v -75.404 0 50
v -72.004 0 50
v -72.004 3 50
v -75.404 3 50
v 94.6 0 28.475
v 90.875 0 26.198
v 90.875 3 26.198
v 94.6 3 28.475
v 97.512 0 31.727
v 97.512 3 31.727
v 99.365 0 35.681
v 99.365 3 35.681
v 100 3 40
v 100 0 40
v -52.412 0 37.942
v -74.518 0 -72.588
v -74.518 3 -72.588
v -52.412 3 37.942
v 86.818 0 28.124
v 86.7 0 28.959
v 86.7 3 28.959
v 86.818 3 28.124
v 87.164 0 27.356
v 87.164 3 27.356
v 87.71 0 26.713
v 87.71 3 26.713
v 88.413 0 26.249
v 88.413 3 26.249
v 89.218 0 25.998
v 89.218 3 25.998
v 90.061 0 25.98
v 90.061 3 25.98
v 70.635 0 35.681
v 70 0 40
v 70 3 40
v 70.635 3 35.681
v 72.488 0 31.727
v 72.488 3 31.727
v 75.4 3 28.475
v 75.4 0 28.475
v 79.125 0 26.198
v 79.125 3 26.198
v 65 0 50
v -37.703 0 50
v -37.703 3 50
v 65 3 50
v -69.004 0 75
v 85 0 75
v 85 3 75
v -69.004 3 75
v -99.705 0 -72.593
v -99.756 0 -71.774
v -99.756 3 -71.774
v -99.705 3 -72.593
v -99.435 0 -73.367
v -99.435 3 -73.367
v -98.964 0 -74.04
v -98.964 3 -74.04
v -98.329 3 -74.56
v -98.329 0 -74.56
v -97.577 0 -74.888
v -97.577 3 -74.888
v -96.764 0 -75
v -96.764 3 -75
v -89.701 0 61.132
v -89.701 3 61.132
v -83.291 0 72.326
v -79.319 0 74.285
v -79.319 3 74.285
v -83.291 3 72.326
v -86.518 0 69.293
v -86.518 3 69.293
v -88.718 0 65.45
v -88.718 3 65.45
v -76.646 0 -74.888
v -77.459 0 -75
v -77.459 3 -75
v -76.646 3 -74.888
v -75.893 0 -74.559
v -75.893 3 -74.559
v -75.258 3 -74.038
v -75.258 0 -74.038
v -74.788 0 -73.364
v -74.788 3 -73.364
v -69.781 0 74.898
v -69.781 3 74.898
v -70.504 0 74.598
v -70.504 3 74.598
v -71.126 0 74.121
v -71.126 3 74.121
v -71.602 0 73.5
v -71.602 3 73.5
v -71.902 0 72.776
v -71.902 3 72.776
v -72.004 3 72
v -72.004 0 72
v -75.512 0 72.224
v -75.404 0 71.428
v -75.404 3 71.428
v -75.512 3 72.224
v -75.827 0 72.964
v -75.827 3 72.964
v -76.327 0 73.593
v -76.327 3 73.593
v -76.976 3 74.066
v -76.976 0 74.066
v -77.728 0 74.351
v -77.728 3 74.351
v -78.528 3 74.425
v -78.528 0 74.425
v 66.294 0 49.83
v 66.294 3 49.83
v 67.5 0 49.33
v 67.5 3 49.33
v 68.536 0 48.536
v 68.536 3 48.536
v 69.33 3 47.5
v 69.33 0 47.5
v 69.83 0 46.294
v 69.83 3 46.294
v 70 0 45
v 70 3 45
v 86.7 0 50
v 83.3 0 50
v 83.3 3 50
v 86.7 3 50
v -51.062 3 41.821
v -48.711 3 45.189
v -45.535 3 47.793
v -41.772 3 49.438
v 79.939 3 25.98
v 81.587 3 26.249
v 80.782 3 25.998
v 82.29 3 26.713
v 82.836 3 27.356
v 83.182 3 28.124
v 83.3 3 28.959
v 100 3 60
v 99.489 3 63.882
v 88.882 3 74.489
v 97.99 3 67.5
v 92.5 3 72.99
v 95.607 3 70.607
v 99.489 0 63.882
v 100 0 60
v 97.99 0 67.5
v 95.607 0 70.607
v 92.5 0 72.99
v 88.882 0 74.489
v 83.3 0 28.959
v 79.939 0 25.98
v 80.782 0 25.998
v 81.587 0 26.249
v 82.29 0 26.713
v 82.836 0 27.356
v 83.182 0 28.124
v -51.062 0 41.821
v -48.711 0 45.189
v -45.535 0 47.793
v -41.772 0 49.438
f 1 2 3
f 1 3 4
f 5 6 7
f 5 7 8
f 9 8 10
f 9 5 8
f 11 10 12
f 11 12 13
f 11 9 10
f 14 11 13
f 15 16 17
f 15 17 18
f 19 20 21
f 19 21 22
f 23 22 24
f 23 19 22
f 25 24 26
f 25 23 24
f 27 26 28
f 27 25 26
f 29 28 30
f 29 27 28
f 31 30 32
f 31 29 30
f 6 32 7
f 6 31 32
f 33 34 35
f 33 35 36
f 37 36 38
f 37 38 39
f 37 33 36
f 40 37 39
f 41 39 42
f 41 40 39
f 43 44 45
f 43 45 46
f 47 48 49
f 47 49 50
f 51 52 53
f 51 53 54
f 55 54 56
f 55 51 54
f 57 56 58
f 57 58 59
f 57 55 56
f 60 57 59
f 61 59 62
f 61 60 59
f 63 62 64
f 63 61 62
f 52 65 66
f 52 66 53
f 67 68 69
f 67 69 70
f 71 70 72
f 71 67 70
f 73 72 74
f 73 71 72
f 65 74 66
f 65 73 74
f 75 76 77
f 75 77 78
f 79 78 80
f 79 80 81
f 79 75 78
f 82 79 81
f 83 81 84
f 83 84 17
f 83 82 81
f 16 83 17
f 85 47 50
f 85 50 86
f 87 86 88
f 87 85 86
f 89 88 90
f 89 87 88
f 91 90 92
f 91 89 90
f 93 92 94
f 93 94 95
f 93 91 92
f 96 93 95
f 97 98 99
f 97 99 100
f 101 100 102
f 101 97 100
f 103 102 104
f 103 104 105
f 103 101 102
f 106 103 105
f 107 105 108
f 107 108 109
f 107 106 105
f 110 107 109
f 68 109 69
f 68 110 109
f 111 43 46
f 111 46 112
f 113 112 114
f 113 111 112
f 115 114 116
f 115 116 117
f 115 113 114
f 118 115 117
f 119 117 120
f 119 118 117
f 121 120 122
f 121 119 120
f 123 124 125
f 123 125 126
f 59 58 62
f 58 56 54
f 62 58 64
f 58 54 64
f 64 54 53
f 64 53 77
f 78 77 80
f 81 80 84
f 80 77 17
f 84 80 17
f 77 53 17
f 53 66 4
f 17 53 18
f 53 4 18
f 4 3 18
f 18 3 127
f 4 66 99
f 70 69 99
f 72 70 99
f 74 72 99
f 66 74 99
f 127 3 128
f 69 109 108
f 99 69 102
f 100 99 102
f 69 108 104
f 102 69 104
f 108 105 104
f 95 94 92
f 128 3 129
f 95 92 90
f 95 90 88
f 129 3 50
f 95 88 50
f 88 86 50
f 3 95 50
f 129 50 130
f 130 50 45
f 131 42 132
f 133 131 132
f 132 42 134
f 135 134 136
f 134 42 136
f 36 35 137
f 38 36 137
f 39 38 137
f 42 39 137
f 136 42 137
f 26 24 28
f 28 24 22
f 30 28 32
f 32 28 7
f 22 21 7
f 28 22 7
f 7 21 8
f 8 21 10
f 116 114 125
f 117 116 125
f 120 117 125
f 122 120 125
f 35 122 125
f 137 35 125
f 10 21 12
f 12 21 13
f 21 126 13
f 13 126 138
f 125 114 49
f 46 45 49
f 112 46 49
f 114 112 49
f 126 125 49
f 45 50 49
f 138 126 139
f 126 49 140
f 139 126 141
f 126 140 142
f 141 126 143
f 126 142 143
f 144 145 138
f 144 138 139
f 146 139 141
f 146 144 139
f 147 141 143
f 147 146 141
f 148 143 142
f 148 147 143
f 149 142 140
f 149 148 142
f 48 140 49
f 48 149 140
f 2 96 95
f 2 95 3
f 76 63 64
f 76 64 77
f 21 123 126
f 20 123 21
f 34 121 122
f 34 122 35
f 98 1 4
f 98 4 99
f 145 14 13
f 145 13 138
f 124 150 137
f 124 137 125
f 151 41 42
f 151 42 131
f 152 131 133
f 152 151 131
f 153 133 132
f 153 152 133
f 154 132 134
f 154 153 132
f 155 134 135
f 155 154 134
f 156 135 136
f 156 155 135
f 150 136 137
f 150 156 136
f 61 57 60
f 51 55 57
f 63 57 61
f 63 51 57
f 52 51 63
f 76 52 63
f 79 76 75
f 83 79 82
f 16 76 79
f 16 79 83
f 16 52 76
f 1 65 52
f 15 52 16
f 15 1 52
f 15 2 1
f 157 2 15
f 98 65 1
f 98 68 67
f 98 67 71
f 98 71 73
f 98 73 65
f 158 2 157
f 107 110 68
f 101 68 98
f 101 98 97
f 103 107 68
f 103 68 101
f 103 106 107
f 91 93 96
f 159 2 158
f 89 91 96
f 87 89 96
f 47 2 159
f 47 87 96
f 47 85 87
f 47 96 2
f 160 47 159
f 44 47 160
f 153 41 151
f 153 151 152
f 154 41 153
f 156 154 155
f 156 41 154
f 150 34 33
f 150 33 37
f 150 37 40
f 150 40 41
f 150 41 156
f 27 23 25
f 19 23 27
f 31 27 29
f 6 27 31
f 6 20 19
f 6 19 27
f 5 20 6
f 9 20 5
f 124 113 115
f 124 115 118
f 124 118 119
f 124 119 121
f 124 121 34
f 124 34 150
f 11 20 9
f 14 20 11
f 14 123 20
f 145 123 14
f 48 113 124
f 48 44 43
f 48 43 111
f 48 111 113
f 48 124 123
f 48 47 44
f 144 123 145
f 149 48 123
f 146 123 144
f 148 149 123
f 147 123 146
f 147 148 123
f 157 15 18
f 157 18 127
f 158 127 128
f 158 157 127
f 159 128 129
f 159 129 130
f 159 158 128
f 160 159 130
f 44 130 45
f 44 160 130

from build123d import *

# Parameters (mm, degrees)
F1_DEPTH = 3


with BuildPart() as f1:
    # F0 (on Front) → F1 (new body)
    with BuildSketch(Plane.XZ):
        with BuildLine():
            ThreePointArc((-99.755909, -71.773679), (-98.964341, -74.039735), (-96.764458, -75))
            Line((-96.764458, -75), (-77.459412, -75))
            ThreePointArc((-77.459412, -75), (-75.557445, -74.320026), (-74.51767, -72.588348))
            Line((-74.51767, -72.588348), (-52.411652, 37.941742))
            ThreePointArc((-52.411652, 37.941742), (-47.212775, 46.600132), (-37.702941, 50))
            Line((-37.702941, 50), (65, 50))
            ThreePointArc((65, 50), (68.535534, 48.535534), (70, 45))
            Line((70, 45), (70, 40))
            ThreePointArc((70, 40), (72.487506, 31.727304), (79.125, 26.198392))
            ThreePointArc((79.125, 26.198392), (81.954539, 26.456215), (83.3, 28.958714))
            Line((83.3, 28.958714), (83.3, 50))
            Line((83.3, 50), (86.7, 50))
            Line((86.7, 50), (86.7, 28.958714))
            ThreePointArc((86.7, 28.958714), (88.045461, 26.456215), (90.875, 26.198392))
            ThreePointArc((90.875, 26.198392), (97.512494, 31.727304), (100, 40))
            Line((100, 40), (100, 50))
            Line((100, 50), (100, 60))
            ThreePointArc((100, 60), (95.606602, 70.606602), (85, 75))
            Line((85, 75), (-69.00419, 75))
            ThreePointArc((-69.00419, 75), (-71.12551, 74.12132), (-72.00419, 72))
            Line((-72.00419, 72), (-72.00419, 50))
            Line((-72.00419, 50), (-75.40419, 50))
            Line((-75.40419, 50), (-75.40419, 71.428027))
            ThreePointArc((-75.40419, 71.428027), (-76.635782, 73.8514), (-79.319347, 74.285034))
            ThreePointArc((-79.319347, 74.285034), (-86.518028, 69.293112), (-89.700815, 61.131607))
            Line((-89.700815, 61.131607), (-99.755909, -71.773679))
        make_face()
    extrude(amount=-F1_DEPTH)


solid = f1.part
